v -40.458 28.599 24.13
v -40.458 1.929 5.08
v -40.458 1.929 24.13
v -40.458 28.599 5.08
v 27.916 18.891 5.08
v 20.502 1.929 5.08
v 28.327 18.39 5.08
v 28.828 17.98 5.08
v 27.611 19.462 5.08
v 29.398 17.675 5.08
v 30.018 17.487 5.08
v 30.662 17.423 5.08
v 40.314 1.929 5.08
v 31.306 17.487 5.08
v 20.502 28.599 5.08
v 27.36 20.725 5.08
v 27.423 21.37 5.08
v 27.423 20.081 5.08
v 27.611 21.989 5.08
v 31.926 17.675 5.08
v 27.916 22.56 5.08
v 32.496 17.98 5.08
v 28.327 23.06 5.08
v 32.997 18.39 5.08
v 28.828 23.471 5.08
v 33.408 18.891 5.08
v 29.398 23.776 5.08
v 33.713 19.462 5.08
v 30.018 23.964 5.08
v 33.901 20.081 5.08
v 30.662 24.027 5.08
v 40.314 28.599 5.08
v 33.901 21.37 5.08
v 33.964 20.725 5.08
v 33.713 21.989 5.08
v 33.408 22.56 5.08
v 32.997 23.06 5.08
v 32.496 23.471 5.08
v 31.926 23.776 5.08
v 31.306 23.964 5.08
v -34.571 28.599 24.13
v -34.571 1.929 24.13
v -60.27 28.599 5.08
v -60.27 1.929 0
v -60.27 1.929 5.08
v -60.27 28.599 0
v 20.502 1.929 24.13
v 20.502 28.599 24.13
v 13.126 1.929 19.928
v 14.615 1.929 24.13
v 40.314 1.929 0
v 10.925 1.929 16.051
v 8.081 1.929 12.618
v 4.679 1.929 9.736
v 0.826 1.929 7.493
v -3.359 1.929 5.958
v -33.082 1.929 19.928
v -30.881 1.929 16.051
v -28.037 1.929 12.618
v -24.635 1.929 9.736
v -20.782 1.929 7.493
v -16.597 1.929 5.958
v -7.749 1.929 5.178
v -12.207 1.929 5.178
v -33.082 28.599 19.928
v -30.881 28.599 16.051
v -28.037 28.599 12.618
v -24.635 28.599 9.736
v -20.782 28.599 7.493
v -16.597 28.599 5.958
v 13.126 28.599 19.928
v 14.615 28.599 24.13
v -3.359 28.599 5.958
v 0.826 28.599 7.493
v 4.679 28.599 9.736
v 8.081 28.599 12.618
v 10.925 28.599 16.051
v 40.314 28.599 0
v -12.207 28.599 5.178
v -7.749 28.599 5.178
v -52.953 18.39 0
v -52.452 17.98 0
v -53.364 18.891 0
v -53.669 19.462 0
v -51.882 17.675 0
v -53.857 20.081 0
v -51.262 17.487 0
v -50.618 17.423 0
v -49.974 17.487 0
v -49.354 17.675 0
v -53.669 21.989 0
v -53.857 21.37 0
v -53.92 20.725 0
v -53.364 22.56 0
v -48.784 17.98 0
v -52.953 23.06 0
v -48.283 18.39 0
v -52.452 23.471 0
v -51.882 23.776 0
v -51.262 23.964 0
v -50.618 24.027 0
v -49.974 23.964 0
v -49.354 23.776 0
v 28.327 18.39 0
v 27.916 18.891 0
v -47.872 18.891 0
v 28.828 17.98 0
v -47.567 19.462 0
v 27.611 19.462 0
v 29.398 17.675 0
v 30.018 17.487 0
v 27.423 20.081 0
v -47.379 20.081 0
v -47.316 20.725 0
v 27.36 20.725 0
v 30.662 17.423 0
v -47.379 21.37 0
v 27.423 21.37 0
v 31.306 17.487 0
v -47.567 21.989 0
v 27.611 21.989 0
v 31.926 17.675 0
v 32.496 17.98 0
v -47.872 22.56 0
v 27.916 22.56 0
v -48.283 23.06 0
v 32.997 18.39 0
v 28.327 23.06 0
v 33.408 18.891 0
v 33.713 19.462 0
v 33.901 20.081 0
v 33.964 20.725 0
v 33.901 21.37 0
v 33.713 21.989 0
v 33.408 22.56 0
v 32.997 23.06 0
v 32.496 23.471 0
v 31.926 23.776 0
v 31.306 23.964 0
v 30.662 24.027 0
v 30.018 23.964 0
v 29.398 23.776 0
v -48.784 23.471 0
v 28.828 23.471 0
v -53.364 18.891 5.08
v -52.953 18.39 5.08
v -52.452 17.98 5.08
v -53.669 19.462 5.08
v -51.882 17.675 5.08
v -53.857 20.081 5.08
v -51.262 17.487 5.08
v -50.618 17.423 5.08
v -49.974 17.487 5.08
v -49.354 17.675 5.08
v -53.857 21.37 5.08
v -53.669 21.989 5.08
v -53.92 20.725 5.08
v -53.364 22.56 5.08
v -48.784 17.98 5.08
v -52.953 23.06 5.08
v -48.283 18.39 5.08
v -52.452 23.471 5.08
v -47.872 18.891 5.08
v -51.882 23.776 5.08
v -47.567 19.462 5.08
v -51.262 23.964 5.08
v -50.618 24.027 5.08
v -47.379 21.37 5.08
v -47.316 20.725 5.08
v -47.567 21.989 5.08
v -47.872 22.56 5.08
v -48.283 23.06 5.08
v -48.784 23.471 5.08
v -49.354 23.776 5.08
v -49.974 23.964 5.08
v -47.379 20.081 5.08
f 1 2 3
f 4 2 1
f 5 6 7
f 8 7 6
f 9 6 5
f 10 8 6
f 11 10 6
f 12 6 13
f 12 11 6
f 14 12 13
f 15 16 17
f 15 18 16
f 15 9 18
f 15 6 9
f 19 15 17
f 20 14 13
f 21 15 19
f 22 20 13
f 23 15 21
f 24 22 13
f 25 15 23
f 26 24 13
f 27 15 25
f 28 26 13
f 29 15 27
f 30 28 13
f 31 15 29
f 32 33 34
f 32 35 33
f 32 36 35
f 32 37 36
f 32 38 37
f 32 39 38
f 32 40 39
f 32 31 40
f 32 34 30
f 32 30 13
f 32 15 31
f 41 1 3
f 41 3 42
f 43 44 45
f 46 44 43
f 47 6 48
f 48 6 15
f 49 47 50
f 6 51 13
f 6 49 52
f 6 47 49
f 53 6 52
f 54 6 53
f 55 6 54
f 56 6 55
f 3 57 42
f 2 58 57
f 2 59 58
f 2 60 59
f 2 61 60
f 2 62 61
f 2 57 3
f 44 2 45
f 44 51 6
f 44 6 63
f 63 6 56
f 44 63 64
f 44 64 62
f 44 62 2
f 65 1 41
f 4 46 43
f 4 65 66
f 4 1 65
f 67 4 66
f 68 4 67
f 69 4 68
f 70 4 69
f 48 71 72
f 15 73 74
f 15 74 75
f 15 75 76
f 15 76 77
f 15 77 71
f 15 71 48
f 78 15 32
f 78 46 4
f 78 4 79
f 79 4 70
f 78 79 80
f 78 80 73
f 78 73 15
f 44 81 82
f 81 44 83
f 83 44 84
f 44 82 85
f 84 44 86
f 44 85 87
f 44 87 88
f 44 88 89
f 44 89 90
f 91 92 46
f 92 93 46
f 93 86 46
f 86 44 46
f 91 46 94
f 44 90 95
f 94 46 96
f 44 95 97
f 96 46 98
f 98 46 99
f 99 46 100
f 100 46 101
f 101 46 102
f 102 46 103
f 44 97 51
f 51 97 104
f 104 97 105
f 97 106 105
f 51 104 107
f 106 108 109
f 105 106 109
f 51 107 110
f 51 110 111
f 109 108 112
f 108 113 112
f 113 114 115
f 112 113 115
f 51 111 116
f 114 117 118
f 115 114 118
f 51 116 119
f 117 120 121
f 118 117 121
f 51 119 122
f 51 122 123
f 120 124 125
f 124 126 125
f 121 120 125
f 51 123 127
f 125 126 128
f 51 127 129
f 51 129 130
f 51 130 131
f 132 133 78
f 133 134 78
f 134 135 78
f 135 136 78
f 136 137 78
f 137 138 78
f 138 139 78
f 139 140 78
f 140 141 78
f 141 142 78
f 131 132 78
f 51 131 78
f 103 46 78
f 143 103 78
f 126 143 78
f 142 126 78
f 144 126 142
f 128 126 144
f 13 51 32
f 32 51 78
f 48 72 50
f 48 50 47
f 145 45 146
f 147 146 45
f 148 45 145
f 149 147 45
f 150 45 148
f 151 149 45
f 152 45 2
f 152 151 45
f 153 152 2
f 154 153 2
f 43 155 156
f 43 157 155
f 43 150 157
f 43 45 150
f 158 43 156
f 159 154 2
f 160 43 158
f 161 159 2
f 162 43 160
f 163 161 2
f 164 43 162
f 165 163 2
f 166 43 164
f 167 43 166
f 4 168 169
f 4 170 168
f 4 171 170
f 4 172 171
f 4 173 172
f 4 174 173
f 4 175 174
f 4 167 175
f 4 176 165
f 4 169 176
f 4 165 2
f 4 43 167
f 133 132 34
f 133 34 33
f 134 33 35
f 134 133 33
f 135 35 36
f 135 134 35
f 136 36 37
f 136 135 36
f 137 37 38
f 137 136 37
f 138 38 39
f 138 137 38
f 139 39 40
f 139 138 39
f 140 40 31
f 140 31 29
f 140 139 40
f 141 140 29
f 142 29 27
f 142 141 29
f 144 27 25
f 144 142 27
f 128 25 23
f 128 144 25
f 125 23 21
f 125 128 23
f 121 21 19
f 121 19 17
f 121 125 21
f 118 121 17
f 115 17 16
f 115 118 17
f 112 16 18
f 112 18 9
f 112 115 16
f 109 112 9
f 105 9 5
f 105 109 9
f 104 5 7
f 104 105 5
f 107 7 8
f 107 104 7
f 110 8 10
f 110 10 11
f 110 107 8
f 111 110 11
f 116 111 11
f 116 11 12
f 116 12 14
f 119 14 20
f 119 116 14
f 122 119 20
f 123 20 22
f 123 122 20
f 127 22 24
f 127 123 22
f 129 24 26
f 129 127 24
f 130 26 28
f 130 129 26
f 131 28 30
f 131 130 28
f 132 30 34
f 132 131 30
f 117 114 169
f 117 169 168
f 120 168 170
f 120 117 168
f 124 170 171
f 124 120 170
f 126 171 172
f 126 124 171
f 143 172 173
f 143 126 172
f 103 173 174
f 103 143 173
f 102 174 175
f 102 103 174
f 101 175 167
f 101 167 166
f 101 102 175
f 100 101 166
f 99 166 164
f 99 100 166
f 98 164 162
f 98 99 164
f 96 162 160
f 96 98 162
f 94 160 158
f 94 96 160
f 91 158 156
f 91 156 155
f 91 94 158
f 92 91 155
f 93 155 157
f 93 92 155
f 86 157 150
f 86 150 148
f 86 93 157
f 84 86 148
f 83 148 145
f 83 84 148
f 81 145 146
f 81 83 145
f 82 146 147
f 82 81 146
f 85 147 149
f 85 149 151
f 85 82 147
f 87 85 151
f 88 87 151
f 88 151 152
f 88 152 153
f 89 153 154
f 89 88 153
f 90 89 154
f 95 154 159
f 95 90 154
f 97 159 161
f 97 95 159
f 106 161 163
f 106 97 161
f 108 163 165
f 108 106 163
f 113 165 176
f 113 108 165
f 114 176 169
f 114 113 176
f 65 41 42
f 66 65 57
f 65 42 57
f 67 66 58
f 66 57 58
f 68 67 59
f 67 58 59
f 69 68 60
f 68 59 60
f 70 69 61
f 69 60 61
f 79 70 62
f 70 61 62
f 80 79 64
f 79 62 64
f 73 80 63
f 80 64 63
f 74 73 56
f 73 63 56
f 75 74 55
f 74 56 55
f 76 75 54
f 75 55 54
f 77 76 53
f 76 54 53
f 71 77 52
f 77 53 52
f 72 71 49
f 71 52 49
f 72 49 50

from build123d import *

# Parameters (mm, degrees)
SKETCH1_W           = 100.584
SKETCH1_H           = 53.34
SKETCH1_R           = 3.302
BOSS_EXTRUDE2_DEPTH = 5.08
SKETCH5_W           = 60.96
SKETCH5_H           = 53.34
BOSS_EXTRUDE3_DEPTH = 19.05
CUT_EXTRUDE4_REACH  = 55.34
SKETCH6_R           = 25.4
SKETCH7_W           = 100.584
SKETCH7_H           = 26.67
CUT_EXTRUDE5_DEPTH  = 25.13


with BuildPart() as part:
    # Sketch1 → Boss-Extrude2 (new body)
    with BuildSketch(Plane.XY):
        with Locations((-9.978006062, 1.929359203)):
            Rectangle(SKETCH1_W, SKETCH1_H)
        with Locations((30.661993938, 20.725359203)):
            Circle(SKETCH1_R, mode=Mode.SUBTRACT)
        with Locations((30.661993938, -16.866640797)):
            Circle(SKETCH1_R, mode=Mode.SUBTRACT)
        with Locations((-50.618006062, 20.725359203)):
            Circle(SKETCH1_R, mode=Mode.SUBTRACT)
        with Locations((-50.618006062, -16.866640797)):
            Circle(SKETCH1_R, mode=Mode.SUBTRACT)
    extrude(amount=BOSS_EXTRUDE2_DEPTH)

    # Sketch5 → Boss-Extrude3 (add)
    with BuildSketch(Plane.XY.offset(5.08)):
        with Locations((-9.978006062, 1.929359203)):
            Rectangle(SKETCH5_W, SKETCH5_H)
    extrude(amount=BOSS_EXTRUDE3_DEPTH)

    # Sketch6 → Cut-Extrude4 (cut, up to next)
    with BuildSketch(Plane.XZ.offset(24.740640797), mode=Mode.PRIVATE) as cut_extrude4_sk1:
        with Locations((-9.978006062, 30.48)):
            Circle(SKETCH6_R)
    cut_extrude4_tool1 = extrude(cut_extrude4_sk1.sketch, amount=-CUT_EXTRUDE4_REACH, mode=Mode.PRIVATE) & part.part
    add(cut_extrude4_tool1.solids().sort_by_distance((-9.978006, -24.740641, 30.48))[0], mode=Mode.SUBTRACT)

    # Sketch7 → Cut-Extrude5 (cut, through all)
    with BuildSketch(Plane(origin=(0, 0, 0), x_dir=(-1, 0, 0), z_dir=(0, 0, -1))):
        with Locations((9.978006062, -11.405640797)):
            Rectangle(SKETCH7_W, SKETCH7_H)
    extrude(amount=-CUT_EXTRUDE5_DEPTH, mode=Mode.SUBTRACT)


solid = part.part
